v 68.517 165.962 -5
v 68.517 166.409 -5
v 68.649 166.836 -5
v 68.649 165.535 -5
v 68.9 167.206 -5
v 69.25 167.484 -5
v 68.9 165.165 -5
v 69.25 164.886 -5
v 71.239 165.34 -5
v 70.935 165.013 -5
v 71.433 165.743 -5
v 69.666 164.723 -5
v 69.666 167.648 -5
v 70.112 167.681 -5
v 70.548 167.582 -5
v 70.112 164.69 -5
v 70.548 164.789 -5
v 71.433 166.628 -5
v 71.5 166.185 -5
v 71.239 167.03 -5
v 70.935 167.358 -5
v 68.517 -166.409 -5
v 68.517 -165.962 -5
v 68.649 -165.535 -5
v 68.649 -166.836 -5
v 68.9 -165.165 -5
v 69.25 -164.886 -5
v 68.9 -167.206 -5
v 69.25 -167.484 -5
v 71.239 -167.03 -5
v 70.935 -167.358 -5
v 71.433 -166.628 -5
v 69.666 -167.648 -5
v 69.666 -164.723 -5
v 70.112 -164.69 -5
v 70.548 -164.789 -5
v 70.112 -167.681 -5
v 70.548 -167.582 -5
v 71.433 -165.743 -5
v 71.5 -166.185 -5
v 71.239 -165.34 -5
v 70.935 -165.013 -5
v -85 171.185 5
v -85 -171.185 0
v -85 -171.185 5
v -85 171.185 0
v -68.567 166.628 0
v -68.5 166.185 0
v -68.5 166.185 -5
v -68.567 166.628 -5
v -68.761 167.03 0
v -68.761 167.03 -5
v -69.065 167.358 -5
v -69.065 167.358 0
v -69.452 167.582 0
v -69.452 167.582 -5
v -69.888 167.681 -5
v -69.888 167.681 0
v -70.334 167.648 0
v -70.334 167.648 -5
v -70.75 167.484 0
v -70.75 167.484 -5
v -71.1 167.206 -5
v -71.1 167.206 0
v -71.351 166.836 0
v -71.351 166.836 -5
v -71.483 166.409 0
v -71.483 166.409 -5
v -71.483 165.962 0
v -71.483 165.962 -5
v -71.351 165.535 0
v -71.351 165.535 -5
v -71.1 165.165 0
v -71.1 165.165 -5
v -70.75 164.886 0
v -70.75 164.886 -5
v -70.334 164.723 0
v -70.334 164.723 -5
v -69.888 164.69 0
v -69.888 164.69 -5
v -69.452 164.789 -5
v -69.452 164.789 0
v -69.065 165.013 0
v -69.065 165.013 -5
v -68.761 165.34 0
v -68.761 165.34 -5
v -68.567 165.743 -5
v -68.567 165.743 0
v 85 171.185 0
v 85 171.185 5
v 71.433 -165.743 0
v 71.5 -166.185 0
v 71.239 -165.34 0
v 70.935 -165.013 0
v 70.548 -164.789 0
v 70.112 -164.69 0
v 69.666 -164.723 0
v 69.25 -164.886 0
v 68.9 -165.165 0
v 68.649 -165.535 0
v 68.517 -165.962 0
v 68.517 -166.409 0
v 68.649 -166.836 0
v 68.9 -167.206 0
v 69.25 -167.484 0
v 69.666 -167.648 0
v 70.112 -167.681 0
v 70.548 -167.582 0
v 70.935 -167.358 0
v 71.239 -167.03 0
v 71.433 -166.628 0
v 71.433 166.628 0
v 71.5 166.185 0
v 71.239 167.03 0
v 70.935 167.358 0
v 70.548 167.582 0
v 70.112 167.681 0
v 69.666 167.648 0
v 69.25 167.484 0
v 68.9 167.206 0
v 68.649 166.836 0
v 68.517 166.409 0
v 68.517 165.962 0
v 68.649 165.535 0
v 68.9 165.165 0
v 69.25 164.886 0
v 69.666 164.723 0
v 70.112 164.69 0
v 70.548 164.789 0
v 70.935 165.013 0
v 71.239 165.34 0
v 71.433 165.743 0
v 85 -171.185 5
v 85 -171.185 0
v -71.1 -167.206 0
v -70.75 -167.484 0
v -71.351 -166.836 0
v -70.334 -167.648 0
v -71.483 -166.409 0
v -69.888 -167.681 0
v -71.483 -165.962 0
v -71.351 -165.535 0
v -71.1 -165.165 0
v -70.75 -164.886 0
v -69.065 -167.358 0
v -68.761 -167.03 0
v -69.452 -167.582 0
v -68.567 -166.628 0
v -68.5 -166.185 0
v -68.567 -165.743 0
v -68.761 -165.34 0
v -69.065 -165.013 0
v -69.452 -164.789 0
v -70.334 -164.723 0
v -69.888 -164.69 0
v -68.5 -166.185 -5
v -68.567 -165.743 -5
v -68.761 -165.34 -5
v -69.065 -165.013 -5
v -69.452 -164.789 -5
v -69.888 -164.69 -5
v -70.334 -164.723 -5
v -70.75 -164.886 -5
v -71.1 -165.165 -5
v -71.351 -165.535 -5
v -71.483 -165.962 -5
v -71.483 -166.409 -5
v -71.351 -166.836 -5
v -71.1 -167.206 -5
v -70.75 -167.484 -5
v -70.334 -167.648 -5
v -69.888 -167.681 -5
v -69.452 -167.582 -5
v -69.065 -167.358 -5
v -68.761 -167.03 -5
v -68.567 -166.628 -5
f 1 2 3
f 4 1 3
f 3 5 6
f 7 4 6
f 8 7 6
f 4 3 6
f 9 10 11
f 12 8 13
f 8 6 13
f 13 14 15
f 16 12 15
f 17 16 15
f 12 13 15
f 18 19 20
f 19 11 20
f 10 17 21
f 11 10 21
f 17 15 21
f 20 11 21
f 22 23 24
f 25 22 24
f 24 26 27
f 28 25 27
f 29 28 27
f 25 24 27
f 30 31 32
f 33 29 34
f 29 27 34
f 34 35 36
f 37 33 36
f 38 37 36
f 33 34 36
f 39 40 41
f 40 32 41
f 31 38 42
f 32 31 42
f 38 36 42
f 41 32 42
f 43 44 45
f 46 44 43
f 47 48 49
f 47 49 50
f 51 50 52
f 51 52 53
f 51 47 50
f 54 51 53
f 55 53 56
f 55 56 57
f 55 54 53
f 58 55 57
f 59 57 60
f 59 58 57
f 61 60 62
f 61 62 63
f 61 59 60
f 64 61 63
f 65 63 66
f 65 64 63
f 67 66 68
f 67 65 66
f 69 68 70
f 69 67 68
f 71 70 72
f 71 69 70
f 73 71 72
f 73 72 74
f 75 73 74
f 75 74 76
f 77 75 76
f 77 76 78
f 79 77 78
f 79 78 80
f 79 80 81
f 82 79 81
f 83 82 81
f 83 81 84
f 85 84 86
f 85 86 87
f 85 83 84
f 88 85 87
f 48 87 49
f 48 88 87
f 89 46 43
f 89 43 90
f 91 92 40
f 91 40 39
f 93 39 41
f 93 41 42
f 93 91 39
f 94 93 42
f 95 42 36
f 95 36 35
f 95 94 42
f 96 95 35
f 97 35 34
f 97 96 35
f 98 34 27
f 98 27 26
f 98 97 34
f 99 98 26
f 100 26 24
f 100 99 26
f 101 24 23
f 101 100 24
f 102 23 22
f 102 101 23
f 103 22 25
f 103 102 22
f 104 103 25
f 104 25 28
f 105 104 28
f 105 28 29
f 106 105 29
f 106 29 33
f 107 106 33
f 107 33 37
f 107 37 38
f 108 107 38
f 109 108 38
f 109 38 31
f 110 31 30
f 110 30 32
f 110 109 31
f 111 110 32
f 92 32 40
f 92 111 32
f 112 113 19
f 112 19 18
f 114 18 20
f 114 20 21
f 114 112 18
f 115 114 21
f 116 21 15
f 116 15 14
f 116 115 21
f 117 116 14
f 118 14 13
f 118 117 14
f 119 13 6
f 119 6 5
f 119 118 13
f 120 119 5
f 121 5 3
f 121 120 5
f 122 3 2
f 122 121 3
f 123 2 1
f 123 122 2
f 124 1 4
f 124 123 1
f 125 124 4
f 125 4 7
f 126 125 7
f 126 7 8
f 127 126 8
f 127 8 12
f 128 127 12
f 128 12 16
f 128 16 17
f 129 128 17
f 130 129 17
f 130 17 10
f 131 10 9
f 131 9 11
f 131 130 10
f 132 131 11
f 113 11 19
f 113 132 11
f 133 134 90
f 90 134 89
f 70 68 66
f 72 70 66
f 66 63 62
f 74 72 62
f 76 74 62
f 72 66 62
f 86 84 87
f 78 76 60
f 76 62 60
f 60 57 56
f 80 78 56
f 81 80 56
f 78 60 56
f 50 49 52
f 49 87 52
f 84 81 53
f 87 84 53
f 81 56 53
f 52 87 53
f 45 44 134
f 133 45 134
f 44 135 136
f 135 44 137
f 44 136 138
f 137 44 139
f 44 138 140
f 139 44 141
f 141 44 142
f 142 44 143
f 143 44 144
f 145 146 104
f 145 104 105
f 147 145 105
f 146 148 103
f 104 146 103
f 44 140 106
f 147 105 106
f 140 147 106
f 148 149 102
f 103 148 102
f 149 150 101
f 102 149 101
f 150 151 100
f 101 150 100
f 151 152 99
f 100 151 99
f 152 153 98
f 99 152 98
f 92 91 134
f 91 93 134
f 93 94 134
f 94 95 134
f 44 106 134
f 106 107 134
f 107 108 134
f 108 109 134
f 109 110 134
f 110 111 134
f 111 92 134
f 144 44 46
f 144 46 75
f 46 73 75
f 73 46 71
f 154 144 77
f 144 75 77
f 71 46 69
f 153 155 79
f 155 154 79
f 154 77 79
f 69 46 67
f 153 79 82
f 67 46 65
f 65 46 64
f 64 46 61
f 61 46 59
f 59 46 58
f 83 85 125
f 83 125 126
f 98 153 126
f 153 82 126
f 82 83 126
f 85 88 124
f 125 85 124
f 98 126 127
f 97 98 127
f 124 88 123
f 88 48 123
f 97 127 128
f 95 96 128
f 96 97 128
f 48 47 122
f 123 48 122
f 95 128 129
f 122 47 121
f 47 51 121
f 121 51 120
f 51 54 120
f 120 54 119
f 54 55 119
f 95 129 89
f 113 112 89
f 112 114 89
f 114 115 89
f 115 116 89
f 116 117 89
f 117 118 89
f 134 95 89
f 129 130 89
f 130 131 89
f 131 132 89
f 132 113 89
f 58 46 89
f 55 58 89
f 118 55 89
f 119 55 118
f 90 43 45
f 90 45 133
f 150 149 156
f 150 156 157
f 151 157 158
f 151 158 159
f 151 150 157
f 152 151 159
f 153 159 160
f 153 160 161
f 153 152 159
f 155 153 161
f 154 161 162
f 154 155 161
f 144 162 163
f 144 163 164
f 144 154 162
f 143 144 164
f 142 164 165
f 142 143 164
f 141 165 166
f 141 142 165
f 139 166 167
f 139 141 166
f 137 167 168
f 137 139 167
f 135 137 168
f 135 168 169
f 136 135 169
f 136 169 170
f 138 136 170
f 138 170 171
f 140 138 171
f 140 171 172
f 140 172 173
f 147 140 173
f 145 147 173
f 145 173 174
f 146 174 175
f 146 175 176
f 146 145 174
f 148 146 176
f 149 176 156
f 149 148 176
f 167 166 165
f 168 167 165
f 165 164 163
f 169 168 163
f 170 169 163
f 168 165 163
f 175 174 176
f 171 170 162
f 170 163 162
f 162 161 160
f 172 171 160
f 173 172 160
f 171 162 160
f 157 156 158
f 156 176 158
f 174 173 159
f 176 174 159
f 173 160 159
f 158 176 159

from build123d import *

# Parameters (mm, degrees)
F0_W     = 170
F0_H     = 342.370798
F1_DEPTH = 5
F2_R     = 1.5
F3_DEPTH = 5


with BuildPart() as f1:
    # F0 (on Top) → F1 (new body)
    with BuildSketch(Plane.XY):
        Rectangle(F0_W, F0_H)
    extrude(amount=F1_DEPTH)

    # F2 (on Top) → F3 (join)
    with BuildSketch(Plane.XY):
        with Locations((70, -166.185399)):
            Circle(F2_R)
        with Locations((-70, -166.185399)):
            Circle(F2_R)
        with Locations((70, 166.185399)):
            Circle(F2_R)
        with Locations((-70, 166.185399)):
            Circle(F2_R)
    extrude(amount=-F3_DEPTH)


solid = f1.part
